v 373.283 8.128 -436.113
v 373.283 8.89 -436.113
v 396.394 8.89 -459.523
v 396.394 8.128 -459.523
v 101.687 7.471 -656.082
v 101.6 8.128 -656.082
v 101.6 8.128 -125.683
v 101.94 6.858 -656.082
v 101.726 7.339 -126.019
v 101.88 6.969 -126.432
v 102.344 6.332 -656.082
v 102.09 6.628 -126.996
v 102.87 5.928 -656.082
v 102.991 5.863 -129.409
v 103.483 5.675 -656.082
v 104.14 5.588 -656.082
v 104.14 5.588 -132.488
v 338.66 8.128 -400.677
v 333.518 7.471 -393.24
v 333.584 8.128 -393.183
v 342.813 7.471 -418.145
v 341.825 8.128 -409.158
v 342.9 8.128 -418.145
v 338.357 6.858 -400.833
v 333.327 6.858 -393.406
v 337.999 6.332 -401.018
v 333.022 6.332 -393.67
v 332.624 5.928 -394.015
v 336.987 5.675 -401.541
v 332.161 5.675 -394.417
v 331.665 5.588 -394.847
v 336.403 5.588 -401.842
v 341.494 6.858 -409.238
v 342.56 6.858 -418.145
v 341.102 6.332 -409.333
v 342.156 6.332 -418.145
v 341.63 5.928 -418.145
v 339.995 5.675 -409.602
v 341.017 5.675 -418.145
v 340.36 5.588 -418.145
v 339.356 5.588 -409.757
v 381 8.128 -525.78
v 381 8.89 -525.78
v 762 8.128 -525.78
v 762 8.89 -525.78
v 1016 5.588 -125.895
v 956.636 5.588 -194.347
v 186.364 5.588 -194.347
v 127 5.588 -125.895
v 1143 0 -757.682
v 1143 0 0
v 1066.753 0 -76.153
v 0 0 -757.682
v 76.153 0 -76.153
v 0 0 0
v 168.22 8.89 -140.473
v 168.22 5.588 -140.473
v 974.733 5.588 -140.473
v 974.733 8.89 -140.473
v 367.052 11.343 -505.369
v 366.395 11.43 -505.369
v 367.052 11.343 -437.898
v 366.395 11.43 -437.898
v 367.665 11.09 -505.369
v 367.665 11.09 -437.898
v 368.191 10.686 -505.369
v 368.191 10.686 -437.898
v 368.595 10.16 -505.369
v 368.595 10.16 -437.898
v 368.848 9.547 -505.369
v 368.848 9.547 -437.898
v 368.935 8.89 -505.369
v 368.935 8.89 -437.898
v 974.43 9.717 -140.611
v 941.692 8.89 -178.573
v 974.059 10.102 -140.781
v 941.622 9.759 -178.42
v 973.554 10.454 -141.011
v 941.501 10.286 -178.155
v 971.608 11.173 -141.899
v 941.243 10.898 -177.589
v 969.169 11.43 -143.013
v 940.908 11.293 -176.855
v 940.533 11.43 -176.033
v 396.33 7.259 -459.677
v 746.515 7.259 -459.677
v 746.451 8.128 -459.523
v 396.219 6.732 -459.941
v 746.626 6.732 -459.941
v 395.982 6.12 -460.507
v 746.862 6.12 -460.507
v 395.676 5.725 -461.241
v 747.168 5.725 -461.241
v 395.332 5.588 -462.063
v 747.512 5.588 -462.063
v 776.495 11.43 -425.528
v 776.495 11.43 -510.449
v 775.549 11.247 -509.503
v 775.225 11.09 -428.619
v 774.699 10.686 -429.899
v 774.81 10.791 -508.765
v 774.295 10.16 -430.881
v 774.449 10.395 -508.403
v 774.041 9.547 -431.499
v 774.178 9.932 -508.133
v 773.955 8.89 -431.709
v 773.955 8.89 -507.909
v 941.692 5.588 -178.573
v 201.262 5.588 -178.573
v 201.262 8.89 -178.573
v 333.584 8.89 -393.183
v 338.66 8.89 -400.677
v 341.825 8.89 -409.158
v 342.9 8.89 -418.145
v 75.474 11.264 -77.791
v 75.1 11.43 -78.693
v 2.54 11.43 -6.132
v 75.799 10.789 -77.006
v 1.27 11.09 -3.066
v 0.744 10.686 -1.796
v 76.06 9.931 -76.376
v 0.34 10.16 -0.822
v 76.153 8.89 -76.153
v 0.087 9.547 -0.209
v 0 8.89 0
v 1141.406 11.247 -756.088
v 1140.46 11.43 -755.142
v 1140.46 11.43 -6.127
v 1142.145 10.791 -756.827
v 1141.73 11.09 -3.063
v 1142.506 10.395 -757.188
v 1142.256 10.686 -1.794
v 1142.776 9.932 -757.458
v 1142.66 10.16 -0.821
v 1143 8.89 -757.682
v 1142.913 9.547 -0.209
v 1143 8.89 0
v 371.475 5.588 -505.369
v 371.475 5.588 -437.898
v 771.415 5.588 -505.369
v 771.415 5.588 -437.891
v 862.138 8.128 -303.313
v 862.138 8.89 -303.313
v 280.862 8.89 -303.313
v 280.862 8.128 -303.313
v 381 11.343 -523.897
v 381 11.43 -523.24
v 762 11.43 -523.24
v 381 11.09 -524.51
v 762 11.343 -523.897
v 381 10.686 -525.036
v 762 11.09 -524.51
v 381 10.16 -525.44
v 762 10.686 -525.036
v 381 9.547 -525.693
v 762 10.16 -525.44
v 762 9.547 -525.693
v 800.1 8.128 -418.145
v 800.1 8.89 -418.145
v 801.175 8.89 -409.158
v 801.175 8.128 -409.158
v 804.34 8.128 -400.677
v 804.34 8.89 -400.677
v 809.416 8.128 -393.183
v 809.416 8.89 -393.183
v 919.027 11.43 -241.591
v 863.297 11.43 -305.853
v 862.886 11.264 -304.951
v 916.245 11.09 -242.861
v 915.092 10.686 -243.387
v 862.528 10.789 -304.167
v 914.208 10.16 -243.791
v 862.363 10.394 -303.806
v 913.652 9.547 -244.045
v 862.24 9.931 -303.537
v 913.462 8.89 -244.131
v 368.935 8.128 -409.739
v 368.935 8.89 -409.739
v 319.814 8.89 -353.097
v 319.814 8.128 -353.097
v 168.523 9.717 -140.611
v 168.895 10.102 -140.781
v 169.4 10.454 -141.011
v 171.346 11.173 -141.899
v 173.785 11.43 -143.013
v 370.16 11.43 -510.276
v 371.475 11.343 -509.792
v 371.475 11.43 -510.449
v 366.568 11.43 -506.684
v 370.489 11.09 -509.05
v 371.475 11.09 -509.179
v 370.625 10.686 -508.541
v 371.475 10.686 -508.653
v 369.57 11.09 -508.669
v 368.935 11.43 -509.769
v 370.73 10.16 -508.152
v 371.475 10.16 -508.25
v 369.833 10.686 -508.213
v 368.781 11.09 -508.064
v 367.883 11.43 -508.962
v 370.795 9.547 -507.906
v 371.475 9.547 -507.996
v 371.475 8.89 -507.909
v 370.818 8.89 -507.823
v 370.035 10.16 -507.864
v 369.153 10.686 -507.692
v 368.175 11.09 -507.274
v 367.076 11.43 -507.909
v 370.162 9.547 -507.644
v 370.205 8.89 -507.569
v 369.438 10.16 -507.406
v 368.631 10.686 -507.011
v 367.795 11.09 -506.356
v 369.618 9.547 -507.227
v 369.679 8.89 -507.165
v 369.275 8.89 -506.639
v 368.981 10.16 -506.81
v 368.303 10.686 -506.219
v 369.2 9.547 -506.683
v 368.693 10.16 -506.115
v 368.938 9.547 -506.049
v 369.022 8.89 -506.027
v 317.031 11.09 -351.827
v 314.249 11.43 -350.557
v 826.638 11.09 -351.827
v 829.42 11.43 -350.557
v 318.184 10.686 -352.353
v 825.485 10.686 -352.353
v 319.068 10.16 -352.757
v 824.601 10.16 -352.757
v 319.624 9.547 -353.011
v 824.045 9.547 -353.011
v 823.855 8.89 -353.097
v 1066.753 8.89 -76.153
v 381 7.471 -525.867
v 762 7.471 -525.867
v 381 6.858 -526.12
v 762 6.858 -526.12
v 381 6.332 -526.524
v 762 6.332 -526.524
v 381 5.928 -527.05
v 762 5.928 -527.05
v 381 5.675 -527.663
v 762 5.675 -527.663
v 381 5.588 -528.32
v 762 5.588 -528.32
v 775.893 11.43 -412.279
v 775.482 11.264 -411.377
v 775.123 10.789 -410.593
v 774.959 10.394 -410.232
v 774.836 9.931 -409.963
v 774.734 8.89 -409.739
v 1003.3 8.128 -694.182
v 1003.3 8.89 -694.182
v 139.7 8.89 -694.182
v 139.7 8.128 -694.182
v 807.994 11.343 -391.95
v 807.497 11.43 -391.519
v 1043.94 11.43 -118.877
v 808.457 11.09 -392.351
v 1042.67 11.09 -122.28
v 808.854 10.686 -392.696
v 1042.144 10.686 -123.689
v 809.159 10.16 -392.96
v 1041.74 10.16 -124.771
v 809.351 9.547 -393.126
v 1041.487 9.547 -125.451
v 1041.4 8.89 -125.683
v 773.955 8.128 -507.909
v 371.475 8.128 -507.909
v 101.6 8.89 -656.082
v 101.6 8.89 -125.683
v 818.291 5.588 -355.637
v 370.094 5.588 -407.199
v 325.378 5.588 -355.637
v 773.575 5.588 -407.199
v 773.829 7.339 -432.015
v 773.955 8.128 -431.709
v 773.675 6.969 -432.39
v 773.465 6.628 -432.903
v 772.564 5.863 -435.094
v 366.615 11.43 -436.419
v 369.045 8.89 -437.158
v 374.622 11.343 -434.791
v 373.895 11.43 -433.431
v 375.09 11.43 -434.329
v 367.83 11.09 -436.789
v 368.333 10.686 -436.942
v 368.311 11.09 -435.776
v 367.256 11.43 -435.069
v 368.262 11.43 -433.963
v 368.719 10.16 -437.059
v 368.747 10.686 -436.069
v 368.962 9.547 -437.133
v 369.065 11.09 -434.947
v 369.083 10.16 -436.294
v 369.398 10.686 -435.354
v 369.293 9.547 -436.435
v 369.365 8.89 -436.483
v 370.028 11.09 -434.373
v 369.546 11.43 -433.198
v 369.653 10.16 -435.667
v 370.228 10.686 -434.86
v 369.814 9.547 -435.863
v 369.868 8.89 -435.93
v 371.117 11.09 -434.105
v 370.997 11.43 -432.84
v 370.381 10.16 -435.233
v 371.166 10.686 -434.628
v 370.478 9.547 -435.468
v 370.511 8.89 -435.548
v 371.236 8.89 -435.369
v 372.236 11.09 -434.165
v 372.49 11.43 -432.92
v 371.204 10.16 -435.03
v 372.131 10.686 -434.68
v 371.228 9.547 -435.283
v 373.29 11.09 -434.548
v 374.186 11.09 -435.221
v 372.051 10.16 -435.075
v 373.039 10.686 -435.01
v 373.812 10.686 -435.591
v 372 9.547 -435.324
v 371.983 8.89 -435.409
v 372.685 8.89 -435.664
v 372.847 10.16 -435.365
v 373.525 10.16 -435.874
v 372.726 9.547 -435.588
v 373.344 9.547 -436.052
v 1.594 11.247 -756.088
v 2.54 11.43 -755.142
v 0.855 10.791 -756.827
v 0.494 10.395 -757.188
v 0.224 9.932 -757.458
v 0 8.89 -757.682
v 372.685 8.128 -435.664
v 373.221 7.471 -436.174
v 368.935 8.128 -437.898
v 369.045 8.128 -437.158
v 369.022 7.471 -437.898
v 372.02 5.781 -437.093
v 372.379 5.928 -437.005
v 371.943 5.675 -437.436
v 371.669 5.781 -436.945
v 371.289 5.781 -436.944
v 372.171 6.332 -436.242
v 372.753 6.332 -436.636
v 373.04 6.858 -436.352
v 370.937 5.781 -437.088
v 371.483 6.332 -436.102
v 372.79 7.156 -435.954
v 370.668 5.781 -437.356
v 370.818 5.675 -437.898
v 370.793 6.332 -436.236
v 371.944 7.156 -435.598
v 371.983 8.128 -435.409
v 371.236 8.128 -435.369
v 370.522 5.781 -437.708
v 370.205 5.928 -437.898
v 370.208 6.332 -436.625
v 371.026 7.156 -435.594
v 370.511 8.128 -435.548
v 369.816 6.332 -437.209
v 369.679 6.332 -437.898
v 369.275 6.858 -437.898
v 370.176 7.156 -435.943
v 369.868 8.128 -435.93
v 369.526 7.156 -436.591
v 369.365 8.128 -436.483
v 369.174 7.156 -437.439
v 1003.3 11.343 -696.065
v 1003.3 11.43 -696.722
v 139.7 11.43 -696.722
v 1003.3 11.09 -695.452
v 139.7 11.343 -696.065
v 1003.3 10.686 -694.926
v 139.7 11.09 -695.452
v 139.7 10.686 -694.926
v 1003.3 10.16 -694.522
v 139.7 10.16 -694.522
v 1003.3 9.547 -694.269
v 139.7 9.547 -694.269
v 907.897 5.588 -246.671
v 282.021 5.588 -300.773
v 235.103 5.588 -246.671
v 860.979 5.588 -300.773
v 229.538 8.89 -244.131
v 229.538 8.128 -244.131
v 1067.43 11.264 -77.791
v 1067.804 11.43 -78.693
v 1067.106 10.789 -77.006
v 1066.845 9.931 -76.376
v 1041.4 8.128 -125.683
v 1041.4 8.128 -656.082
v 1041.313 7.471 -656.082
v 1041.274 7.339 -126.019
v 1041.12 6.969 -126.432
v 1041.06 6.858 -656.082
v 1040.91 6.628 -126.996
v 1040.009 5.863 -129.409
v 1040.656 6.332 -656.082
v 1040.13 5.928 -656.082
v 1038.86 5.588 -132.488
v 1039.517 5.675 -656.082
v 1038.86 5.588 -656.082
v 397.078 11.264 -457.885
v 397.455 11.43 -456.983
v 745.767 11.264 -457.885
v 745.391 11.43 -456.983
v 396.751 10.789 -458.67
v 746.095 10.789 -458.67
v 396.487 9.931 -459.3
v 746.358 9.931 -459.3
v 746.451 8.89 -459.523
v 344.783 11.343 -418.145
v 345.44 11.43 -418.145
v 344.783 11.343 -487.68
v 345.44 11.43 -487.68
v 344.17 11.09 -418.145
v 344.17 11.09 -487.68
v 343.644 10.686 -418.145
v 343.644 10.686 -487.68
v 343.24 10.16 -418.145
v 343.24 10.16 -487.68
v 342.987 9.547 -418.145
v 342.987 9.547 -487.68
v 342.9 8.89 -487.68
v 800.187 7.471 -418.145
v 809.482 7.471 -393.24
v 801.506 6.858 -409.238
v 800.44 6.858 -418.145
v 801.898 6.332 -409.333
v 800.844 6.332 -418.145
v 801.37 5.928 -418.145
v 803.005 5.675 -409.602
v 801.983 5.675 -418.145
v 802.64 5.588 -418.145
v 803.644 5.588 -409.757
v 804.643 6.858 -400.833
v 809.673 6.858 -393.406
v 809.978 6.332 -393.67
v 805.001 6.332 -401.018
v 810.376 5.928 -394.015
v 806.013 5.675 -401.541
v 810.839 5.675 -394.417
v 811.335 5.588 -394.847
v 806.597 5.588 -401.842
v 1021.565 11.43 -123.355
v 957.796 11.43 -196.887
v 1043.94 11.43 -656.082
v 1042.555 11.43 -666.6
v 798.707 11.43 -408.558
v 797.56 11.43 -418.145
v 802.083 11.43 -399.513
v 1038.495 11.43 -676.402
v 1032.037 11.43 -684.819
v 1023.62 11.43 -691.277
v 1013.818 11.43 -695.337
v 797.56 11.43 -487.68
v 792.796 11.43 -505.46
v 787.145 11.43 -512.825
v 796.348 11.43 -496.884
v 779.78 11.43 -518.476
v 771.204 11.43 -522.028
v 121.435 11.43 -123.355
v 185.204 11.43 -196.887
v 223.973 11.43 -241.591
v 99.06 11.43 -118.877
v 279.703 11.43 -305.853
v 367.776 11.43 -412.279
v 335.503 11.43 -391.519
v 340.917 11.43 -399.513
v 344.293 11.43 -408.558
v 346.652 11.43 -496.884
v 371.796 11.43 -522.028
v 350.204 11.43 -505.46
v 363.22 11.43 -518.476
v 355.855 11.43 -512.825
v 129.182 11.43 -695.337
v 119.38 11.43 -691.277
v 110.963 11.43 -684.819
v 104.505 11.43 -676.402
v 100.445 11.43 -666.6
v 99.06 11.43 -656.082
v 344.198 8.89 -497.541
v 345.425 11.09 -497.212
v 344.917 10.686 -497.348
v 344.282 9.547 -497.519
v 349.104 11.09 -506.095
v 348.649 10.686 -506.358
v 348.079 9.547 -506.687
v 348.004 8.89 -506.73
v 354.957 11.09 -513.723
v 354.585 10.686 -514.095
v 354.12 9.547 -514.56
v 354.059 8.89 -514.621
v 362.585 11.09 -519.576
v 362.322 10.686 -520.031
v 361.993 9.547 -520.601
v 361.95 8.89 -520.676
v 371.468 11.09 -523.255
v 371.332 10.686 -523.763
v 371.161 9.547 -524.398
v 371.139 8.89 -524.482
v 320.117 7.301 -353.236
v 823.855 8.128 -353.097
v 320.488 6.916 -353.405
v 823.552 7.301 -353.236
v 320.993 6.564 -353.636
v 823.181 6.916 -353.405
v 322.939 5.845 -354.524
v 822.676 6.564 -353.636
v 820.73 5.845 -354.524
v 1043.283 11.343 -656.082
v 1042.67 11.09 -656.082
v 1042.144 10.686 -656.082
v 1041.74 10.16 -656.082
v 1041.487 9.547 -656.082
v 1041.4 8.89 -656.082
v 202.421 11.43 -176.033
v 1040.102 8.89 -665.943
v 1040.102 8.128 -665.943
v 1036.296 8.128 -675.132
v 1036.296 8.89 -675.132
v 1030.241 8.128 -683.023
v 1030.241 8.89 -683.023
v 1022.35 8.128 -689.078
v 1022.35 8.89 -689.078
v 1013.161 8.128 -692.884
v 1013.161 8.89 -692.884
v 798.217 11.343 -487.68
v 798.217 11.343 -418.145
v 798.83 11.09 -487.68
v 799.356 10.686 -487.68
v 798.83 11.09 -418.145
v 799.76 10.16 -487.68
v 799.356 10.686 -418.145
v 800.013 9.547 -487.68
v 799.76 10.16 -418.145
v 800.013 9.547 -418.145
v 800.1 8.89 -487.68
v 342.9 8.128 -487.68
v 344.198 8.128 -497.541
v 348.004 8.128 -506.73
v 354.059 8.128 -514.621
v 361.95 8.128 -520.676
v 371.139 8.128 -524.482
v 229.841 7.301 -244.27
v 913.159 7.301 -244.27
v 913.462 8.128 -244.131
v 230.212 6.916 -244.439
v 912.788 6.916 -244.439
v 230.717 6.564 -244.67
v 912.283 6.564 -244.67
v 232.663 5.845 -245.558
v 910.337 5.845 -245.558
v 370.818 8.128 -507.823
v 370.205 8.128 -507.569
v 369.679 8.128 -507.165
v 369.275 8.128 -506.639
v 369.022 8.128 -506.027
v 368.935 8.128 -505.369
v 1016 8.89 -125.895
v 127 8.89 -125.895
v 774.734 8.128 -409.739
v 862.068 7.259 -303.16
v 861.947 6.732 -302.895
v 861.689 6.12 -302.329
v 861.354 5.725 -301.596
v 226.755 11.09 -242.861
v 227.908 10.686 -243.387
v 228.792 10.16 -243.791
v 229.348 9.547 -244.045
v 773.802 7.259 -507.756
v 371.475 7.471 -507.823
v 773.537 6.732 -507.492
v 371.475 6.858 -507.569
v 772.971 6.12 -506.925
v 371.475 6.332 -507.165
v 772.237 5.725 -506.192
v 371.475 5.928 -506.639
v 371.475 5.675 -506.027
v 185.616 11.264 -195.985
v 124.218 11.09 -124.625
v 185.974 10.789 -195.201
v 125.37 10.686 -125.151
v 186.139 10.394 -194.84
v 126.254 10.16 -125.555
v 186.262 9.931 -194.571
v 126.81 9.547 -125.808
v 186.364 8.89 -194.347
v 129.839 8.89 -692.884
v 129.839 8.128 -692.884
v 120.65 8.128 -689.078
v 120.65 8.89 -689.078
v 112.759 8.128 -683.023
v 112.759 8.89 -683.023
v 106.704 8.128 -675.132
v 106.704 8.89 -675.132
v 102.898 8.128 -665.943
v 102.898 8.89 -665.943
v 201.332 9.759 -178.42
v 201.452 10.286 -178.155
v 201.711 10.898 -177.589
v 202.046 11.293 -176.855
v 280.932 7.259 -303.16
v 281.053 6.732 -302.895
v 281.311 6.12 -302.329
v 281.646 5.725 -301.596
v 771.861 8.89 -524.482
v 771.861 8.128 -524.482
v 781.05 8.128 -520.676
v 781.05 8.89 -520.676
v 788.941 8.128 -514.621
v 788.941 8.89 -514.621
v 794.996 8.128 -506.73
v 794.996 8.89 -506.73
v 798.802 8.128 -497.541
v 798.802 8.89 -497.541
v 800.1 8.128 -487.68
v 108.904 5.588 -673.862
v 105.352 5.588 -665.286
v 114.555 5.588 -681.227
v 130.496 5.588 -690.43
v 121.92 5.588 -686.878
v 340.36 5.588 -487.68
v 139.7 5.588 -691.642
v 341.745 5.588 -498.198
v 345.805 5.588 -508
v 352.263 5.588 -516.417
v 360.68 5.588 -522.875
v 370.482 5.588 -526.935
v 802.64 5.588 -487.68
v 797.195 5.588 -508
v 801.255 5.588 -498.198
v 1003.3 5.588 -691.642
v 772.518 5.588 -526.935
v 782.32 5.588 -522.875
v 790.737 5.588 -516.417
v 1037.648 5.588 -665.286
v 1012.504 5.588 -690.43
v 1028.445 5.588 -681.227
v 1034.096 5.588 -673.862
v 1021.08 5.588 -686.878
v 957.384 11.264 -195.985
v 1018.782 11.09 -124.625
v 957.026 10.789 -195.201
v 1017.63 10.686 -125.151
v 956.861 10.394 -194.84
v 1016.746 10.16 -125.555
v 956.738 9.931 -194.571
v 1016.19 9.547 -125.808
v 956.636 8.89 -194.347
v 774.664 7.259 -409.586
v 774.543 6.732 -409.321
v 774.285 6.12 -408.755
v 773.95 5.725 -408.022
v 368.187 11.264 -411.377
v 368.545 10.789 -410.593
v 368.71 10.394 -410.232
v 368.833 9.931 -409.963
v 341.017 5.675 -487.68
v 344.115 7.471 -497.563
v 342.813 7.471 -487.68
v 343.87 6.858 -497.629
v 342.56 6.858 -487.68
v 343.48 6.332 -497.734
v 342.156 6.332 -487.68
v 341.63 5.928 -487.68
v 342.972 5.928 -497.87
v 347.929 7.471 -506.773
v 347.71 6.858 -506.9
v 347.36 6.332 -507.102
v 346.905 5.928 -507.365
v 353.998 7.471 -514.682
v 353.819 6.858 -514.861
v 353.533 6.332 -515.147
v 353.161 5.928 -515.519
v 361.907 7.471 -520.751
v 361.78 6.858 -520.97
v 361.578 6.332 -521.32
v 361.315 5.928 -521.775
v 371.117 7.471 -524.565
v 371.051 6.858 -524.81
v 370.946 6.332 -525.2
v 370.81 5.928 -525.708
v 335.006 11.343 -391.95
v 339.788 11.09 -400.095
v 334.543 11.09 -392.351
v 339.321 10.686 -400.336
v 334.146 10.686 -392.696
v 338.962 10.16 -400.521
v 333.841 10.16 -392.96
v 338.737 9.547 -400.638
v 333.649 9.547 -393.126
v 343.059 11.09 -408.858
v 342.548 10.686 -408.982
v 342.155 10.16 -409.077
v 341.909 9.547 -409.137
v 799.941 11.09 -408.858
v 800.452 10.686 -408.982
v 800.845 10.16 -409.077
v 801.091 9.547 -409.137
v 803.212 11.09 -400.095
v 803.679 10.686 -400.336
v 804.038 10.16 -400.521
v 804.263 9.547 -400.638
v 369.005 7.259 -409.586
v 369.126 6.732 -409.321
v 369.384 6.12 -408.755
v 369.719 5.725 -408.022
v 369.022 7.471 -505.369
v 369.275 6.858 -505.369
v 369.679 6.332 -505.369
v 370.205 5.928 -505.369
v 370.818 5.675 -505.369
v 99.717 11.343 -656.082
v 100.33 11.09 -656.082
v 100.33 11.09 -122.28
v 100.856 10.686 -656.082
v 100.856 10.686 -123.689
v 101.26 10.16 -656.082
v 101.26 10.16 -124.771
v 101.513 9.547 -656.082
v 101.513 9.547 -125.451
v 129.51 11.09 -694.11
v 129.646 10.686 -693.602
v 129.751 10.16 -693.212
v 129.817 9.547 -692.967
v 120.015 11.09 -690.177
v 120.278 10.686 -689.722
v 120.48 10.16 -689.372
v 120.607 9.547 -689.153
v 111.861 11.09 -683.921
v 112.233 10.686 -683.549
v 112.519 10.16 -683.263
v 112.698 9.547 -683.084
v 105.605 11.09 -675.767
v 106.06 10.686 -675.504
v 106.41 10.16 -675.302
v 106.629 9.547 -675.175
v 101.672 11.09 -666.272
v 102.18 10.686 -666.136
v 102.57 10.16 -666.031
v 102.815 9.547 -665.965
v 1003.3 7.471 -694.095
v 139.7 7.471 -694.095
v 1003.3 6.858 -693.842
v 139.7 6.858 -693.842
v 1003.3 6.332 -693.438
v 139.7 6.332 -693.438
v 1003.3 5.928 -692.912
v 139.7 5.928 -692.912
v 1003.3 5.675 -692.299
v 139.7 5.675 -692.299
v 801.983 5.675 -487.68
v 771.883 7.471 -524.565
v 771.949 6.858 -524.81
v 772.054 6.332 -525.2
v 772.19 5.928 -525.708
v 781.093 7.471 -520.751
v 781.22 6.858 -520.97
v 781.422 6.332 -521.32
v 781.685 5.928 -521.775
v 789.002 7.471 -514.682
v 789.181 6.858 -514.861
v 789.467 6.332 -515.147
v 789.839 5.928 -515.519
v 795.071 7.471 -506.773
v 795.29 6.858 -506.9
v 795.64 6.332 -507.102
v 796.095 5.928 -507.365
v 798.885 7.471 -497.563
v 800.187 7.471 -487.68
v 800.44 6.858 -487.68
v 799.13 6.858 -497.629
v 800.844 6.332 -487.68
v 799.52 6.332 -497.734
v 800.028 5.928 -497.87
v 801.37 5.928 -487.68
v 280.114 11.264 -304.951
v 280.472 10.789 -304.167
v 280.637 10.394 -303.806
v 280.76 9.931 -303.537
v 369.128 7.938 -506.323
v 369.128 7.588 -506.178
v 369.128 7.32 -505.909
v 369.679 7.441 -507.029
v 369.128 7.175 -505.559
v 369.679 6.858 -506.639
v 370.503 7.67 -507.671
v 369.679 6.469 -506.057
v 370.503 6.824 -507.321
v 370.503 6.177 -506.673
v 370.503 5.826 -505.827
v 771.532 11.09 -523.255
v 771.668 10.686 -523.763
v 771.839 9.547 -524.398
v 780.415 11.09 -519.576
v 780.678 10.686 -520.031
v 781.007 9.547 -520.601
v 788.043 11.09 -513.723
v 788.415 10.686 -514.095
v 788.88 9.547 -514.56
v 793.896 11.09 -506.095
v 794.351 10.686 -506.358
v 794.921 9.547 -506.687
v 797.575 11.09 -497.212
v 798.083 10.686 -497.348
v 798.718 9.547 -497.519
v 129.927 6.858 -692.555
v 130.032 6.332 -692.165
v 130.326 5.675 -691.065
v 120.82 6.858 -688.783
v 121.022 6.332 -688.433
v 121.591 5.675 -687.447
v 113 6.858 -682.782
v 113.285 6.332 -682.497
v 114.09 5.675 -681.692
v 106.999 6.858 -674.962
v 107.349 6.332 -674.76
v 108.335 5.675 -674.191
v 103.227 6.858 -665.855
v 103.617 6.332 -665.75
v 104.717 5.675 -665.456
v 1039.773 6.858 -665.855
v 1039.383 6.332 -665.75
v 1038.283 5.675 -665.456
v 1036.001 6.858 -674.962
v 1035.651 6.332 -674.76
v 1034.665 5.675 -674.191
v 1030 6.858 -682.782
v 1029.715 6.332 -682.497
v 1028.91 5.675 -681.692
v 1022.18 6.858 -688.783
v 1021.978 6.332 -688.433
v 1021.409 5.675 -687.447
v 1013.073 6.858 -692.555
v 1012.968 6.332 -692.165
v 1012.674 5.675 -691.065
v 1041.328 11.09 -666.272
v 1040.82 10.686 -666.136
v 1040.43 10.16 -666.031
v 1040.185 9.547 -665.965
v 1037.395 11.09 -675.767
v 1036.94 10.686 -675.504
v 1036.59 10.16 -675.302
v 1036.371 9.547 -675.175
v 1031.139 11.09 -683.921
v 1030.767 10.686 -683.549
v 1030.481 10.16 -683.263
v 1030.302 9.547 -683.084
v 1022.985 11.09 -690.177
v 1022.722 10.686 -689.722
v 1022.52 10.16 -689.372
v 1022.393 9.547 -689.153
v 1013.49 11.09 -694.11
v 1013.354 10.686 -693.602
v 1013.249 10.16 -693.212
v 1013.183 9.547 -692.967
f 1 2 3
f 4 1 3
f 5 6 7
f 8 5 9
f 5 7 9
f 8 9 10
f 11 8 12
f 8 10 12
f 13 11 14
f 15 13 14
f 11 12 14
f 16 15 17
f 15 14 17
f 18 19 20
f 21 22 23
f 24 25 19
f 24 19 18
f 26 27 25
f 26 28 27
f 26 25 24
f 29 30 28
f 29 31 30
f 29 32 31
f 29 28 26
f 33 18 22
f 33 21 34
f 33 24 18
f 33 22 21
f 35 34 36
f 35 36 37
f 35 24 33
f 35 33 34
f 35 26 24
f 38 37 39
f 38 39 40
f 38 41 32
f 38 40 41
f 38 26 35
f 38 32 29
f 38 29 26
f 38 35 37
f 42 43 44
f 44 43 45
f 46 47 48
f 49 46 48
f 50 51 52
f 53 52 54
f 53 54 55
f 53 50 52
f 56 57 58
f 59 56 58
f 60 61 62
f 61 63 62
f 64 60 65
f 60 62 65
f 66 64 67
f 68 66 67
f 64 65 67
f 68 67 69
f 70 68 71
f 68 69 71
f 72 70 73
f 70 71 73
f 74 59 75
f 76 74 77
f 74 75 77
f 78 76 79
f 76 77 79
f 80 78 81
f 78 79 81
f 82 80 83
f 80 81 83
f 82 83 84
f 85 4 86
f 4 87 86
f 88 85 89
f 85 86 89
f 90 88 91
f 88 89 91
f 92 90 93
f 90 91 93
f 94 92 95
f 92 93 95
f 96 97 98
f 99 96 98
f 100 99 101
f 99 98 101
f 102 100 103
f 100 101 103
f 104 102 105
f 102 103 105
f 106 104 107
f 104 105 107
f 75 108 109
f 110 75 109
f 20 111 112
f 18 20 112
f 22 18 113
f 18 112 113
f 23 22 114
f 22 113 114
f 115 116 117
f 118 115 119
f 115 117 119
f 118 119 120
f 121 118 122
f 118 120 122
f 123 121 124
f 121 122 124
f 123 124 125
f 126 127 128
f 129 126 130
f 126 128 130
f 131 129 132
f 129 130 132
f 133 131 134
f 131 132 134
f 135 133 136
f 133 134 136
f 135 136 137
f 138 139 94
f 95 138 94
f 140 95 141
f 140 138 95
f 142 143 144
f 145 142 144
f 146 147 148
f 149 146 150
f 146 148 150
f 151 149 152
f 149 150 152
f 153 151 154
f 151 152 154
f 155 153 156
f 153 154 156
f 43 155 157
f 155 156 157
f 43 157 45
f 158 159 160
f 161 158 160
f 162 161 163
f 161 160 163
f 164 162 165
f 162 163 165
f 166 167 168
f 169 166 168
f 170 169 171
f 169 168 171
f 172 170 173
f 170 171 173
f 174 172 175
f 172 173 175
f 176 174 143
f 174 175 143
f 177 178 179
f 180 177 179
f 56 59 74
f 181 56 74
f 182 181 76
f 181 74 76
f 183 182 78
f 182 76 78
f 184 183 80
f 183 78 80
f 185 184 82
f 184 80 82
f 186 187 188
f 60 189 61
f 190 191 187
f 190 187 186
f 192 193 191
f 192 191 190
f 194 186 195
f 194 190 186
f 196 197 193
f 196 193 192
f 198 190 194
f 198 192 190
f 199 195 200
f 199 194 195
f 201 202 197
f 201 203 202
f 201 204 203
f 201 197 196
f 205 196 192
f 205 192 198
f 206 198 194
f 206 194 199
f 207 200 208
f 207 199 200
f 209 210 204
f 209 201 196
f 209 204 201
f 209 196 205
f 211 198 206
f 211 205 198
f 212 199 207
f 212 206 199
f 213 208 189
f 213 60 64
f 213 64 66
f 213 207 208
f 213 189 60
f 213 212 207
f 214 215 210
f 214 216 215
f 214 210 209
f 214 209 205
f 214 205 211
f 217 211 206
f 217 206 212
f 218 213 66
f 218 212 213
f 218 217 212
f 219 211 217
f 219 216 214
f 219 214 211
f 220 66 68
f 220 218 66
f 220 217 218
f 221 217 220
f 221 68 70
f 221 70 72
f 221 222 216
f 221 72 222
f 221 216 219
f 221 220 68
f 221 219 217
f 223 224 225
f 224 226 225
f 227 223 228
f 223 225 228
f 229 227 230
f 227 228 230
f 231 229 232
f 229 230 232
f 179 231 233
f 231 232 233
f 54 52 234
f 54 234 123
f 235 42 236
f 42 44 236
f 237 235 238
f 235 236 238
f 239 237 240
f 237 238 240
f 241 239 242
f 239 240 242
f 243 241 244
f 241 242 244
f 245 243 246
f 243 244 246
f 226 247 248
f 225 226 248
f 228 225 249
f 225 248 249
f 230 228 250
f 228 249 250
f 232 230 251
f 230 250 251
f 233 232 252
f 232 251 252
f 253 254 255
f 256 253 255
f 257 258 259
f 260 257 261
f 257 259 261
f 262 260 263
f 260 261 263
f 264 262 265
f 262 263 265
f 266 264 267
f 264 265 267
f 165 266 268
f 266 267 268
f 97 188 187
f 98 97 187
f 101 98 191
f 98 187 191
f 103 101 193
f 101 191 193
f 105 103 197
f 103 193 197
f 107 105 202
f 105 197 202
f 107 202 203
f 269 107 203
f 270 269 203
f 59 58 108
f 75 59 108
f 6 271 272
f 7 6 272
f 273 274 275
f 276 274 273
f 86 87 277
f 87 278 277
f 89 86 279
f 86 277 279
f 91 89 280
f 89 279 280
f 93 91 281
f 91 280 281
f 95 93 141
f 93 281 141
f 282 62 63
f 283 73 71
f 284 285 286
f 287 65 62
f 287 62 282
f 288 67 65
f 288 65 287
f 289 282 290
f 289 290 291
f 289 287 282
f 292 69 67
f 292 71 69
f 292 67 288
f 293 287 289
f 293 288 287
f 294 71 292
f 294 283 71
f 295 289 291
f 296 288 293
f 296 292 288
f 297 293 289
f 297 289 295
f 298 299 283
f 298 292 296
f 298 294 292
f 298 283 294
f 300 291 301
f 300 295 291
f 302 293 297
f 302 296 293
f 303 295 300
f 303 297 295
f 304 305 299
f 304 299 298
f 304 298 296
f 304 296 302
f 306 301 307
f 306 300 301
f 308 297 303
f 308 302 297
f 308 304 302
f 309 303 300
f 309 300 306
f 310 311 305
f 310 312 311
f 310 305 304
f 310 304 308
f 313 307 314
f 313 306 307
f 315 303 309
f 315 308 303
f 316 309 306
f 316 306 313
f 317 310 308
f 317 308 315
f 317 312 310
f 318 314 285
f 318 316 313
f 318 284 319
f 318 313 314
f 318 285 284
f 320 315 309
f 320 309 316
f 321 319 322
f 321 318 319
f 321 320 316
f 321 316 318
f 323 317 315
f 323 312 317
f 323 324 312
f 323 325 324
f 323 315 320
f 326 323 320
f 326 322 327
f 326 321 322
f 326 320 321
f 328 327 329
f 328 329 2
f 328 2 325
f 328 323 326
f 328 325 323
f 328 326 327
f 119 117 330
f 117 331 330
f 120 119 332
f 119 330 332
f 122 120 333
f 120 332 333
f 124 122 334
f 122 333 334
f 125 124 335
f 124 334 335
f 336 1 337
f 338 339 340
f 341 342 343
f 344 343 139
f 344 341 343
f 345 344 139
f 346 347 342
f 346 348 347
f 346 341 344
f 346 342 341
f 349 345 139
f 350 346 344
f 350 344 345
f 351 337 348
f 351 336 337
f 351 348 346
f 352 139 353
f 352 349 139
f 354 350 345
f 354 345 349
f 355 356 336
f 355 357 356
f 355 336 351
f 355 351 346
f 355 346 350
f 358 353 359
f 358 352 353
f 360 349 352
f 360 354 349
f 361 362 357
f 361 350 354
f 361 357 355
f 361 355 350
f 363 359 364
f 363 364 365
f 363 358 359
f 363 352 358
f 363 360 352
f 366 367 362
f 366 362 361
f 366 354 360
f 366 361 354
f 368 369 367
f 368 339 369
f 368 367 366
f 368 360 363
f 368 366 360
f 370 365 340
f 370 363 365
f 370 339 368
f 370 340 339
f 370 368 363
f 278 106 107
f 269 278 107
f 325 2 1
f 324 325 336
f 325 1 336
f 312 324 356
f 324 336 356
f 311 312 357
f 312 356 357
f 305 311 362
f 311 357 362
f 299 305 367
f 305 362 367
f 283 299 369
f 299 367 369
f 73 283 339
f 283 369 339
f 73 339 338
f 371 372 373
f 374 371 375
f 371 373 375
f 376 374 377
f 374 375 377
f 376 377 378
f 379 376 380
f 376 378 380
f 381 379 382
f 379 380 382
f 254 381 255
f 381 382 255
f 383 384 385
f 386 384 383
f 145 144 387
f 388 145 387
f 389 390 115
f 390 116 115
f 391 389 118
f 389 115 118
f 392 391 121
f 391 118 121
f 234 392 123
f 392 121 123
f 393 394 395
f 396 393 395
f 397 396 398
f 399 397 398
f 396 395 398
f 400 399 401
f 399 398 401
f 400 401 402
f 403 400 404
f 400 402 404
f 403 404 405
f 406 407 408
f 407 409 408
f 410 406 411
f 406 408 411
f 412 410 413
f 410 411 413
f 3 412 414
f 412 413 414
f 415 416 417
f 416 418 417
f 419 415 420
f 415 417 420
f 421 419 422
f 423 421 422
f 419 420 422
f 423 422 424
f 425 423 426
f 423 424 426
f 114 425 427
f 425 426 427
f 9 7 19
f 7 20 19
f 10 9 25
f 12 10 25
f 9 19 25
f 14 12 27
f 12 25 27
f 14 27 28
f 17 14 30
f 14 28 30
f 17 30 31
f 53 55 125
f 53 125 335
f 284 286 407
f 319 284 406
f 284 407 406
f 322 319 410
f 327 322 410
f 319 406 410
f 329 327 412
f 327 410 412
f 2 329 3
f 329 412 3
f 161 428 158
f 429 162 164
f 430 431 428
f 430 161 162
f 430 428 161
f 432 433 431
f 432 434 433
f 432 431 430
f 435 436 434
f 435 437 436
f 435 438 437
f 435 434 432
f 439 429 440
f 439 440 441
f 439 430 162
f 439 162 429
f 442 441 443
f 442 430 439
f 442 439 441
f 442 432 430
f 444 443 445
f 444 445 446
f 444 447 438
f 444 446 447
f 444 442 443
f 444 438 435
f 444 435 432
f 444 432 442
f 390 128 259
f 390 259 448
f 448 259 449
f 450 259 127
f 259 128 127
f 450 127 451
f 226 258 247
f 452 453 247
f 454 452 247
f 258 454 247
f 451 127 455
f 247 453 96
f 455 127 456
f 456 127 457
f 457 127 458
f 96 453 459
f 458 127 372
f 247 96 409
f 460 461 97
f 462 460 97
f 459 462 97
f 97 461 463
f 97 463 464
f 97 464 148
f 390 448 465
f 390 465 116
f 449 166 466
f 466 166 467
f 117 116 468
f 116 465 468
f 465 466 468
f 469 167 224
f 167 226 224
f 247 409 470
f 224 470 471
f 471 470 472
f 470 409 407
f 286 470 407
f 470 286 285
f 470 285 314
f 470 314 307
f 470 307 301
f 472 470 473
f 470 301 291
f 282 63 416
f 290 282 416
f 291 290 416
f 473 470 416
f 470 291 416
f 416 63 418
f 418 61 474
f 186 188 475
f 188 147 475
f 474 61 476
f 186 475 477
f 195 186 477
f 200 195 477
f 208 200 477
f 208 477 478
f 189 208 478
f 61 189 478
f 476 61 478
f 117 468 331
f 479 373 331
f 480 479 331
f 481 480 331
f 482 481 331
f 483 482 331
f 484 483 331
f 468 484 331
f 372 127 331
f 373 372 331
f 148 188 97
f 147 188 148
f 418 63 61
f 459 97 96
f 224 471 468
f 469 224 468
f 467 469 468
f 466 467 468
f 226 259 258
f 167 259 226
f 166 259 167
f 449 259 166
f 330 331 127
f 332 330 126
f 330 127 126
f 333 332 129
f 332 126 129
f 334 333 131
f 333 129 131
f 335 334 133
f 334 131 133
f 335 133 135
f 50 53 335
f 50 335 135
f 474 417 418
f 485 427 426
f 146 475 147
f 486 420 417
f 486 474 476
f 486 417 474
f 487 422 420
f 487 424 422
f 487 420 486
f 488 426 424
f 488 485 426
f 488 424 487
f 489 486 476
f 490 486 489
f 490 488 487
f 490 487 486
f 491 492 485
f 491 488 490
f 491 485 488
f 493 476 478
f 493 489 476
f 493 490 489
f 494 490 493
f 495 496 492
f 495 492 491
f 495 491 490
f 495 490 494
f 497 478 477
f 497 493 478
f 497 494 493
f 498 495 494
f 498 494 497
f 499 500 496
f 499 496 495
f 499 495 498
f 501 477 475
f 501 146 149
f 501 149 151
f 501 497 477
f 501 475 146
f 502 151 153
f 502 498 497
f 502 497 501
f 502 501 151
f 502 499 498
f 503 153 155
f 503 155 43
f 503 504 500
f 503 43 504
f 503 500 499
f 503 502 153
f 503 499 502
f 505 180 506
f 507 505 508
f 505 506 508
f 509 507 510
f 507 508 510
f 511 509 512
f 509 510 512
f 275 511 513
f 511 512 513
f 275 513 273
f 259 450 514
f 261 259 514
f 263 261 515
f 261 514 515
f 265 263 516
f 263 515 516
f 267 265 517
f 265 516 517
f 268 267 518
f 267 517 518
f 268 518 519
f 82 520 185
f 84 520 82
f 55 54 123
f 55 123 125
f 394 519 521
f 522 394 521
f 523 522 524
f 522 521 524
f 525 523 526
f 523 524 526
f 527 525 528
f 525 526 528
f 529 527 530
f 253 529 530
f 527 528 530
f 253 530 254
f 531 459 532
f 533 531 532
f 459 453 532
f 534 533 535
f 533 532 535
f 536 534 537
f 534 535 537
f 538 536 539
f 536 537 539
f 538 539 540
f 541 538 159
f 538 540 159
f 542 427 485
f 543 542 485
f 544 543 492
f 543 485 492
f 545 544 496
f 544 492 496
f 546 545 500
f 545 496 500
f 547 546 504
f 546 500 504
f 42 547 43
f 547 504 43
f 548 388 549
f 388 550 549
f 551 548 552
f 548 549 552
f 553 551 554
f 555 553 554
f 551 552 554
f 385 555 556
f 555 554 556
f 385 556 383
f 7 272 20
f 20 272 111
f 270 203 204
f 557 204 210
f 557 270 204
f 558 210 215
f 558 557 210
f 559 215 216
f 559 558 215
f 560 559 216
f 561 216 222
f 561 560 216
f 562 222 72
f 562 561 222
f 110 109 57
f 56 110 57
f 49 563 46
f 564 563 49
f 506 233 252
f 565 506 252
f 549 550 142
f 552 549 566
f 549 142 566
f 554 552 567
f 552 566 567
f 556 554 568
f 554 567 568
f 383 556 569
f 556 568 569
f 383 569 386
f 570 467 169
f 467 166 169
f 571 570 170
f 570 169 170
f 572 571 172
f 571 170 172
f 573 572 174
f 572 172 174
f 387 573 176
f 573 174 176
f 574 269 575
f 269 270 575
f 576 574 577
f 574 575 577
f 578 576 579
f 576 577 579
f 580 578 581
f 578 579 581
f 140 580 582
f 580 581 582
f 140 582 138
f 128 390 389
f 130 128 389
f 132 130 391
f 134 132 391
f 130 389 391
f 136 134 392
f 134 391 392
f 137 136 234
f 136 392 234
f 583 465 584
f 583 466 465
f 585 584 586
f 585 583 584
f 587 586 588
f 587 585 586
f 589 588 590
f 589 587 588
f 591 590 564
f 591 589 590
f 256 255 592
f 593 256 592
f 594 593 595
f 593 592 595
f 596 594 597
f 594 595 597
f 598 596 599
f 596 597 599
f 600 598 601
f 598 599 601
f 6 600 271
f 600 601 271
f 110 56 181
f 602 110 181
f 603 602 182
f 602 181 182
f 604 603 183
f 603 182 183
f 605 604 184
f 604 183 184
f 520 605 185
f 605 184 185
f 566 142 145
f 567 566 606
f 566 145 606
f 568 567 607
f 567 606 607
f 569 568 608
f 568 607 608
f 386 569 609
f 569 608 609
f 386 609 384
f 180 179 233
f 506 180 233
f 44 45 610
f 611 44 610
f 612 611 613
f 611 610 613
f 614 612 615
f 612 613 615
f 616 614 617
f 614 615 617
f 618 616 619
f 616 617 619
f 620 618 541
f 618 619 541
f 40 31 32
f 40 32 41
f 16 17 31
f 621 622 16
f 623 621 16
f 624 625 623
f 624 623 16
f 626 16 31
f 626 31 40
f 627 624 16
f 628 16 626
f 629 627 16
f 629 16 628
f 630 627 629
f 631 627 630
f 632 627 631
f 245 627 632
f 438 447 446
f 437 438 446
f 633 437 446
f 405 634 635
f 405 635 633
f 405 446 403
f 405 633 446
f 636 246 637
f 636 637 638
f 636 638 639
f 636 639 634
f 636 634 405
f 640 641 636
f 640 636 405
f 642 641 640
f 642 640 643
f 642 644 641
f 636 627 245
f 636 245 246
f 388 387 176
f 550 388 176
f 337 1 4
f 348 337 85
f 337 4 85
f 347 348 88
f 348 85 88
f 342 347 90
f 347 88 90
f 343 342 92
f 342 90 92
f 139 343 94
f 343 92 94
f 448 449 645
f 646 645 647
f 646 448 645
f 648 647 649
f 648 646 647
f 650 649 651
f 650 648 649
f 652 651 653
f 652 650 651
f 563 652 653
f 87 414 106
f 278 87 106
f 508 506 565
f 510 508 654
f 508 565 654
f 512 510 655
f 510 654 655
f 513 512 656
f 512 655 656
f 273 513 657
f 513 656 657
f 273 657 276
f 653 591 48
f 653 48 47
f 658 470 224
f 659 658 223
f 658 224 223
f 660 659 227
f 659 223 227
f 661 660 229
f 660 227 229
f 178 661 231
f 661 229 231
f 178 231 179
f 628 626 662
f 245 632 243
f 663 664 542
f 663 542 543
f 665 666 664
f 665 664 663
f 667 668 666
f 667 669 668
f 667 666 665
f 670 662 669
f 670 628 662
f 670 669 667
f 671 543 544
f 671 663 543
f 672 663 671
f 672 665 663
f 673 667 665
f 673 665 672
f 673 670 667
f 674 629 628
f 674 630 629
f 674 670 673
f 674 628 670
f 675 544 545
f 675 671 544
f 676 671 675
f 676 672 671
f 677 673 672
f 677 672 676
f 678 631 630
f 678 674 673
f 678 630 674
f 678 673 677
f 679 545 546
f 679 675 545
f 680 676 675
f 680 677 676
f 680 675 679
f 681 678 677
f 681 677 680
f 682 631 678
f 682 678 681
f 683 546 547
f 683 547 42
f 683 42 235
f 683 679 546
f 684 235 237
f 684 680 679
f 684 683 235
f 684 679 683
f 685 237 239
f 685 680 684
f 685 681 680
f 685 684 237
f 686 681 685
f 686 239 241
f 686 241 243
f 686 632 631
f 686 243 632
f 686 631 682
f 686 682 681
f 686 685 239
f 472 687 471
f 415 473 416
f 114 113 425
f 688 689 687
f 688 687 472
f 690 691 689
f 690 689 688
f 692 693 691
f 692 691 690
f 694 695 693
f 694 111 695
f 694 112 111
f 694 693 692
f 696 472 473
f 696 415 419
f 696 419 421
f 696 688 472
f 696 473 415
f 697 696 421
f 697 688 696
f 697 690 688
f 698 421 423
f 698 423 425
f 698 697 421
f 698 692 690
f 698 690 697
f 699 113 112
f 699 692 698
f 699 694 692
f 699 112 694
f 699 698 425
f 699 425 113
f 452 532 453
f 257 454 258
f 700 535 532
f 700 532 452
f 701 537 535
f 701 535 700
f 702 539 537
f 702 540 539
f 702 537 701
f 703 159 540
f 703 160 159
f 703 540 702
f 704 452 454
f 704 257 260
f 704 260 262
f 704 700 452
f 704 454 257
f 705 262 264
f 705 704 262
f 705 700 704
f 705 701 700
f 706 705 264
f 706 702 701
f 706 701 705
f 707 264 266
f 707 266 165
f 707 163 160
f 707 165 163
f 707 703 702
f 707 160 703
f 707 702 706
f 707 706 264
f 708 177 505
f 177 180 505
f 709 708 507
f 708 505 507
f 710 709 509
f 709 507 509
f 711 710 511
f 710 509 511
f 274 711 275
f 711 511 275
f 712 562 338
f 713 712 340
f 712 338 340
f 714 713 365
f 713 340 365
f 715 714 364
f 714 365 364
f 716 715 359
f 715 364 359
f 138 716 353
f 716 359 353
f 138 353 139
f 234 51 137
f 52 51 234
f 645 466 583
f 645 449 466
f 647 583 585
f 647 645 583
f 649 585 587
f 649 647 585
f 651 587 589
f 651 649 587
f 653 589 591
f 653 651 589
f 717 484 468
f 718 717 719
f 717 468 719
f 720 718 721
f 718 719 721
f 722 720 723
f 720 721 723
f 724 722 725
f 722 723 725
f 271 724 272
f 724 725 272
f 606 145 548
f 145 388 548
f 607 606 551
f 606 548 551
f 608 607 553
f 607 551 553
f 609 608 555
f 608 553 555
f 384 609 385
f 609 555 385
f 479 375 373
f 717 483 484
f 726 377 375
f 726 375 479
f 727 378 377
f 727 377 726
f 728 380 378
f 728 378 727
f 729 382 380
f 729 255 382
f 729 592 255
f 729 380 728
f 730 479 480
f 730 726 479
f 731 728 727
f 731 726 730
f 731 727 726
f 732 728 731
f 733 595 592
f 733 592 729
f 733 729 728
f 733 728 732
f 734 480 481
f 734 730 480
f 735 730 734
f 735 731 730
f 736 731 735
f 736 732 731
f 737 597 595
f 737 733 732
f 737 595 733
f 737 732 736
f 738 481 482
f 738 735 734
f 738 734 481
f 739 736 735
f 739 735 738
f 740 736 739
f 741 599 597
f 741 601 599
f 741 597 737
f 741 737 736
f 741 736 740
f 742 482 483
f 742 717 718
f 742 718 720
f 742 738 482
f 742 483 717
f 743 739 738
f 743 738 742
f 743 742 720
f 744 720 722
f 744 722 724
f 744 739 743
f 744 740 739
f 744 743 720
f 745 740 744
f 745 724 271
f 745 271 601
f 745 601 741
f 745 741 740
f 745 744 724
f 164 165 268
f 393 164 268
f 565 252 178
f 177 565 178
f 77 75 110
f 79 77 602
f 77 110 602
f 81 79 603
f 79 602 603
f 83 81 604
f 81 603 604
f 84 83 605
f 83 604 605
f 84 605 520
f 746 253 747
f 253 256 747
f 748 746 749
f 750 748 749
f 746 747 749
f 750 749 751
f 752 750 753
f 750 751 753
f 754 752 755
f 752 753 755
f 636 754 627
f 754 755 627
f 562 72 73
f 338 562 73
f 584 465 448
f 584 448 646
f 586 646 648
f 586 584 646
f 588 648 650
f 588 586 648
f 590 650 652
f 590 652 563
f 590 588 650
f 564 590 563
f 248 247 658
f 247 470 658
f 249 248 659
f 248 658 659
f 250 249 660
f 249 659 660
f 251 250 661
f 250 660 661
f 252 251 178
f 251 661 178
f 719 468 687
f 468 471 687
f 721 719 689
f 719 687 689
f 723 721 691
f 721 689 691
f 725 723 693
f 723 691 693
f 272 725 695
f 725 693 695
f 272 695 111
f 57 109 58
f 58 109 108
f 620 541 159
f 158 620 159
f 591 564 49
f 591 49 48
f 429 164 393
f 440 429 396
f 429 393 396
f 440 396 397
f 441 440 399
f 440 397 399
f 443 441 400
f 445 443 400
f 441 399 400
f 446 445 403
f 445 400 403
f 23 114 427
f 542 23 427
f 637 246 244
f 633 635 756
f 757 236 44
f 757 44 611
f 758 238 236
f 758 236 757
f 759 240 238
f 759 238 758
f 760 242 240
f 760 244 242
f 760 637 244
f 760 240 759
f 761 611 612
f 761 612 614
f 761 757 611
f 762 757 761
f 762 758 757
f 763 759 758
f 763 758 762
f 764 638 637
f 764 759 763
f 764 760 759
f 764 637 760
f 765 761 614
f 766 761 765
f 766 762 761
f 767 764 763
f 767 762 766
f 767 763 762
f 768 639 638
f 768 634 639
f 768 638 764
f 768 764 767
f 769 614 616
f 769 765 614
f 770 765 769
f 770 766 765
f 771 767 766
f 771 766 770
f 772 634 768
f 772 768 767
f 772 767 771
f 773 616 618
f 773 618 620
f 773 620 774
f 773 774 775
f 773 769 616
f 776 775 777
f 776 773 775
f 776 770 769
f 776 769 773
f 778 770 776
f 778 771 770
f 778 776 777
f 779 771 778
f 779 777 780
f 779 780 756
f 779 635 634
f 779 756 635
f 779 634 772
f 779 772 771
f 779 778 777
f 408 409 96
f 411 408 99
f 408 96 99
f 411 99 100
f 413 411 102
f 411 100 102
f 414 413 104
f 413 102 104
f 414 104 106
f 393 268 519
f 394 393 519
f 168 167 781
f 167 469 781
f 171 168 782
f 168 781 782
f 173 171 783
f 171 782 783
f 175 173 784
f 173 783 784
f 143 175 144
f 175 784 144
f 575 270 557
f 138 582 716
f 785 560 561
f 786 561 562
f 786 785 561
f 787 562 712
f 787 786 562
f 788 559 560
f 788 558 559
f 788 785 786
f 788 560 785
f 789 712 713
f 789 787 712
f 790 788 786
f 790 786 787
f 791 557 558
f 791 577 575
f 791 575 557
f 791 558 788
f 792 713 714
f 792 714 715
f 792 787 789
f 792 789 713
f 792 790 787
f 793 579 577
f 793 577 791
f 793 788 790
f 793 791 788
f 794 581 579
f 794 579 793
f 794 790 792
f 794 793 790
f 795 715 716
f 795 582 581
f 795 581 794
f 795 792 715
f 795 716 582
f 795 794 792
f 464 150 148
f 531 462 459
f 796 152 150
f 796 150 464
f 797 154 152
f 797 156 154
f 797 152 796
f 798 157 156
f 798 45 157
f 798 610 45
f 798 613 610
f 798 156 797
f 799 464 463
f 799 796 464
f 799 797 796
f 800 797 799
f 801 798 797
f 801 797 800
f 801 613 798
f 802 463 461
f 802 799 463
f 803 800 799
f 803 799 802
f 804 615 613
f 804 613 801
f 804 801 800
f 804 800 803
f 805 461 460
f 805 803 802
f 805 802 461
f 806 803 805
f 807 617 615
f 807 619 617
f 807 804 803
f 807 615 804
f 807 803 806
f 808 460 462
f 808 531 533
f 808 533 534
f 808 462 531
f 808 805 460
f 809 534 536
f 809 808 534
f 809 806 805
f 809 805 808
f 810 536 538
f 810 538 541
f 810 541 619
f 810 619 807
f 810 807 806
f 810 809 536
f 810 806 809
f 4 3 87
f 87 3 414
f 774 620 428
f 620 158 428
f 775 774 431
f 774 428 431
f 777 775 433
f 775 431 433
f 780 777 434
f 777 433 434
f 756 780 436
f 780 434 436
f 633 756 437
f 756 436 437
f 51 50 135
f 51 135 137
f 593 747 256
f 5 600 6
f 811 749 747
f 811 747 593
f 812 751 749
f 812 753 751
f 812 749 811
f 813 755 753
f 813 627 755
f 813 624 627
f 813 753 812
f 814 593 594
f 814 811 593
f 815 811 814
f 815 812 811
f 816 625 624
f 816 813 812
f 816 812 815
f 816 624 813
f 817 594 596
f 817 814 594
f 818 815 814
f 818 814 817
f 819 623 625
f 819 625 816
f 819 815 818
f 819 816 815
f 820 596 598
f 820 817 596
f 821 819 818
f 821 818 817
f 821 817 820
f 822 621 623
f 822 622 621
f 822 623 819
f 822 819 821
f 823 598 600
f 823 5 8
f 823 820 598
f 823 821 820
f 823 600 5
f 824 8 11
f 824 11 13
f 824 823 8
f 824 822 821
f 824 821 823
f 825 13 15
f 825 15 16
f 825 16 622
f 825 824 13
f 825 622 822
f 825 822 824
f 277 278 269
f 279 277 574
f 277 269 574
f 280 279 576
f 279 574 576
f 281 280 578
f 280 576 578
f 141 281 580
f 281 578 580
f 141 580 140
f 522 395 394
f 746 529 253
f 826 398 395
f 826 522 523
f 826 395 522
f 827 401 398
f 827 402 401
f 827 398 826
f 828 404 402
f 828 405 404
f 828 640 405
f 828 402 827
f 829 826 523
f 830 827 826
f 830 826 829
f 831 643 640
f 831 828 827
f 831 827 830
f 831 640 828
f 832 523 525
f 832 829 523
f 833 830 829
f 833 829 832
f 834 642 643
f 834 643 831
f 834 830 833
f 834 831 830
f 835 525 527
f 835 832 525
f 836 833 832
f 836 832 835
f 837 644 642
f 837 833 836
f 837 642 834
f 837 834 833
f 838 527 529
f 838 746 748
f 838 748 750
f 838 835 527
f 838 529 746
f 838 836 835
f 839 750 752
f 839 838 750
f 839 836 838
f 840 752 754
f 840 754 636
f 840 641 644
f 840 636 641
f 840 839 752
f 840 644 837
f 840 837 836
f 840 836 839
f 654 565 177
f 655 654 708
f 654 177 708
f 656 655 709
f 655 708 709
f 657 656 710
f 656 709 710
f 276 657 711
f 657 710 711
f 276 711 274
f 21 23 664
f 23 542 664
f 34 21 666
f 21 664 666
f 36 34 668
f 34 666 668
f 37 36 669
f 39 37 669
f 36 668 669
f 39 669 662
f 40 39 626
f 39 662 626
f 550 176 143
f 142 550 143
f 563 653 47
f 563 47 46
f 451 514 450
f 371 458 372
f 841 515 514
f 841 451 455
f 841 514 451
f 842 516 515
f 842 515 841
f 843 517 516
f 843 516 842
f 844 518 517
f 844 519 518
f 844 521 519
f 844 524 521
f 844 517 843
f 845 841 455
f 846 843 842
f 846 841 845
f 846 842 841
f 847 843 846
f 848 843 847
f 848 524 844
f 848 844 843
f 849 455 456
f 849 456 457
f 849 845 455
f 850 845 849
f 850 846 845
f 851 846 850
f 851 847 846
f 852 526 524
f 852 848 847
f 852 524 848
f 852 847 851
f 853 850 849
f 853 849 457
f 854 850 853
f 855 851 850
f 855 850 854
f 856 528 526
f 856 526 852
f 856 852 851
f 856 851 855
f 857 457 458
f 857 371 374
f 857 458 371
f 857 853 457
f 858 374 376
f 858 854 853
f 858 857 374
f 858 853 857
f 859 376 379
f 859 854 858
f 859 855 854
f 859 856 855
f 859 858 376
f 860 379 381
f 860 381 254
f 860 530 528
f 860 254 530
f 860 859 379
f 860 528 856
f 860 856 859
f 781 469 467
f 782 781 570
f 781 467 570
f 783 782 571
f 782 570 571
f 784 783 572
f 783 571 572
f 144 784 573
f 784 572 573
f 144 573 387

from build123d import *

# Parameters (mm, degrees)
BASE_FLANGE1_DEPTH = 11.43
CUT_EXTRUDE1_DEPTH = 5.842
CUT_EXTRUDE2_DEPTH = 5.842
BASE_FLANGE2_DEPTH = 5.842
CUT_EXTRUDE3_DEPTH = 5.842
FILLET1_R          = 2.54
FILLET2_R          = 2.54
FILLET3_R          = 2.54
FILLET4_R          = 2.54
FILLET5_R          = 2.54


# Sheet-metal steps are written as plain solids
with BuildPart() as part:
    # Sketch1 → Base-Flange1 (new body)
    with BuildSketch(Plane(origin=(0, 0, 0), x_dir=(1, 0, 0), z_dir=(0, 1, 0))):
        Polygon((0, 0), (0, 757.682), (1143, 757.682), (1143, 0), (1066.752571907, 76.152571907), (76.152571907, 76.152571907), align=None)
    extrude(amount=BASE_FLANGE1_DEPTH)

    # Sketch6 → Cut-Extrude1 (cut)
    with BuildSketch(Plane(origin=(0, 11.43, 0), x_dir=(1, 0, 0), z_dir=(0, 1, 0))):
        with BuildLine():
            Line((101.6, 656.082), (101.6, 125.682571907))
            Line((101.6, 125.682571907), (333.583764746, 393.18307912))
            ThreePointArc((333.583764746, 393.18307912), (340.495037728, 404.823200721), (342.9, 418.145148086))
            Line((342.9, 418.145148086), (342.9, 487.68))
            ThreePointArc((342.9, 487.68), (354.059231637, 514.620768363), (381, 525.78))
            Line((381, 525.78), (762, 525.78))
            ThreePointArc((762, 525.78), (788.940768363, 514.620768363), (800.1, 487.68))
            Line((800.1, 487.68), (800.1, 418.145148086))
            ThreePointArc((800.1, 418.145148086), (802.504962272, 404.823200721), (809.416235254, 393.18307912))
            Line((809.416235254, 393.18307912), (1041.4, 125.682571907))
            Line((1041.4, 125.682571907), (1041.4, 656.082))
            ThreePointArc((1041.4, 656.082), (1030.240768363, 683.022768363), (1003.3, 694.182))
            Line((1003.3, 694.182), (139.7, 694.182))
            ThreePointArc((139.7, 694.182), (112.759231637, 683.022768363), (101.6, 656.082))
        make_face()
    extrude(amount=-CUT_EXTRUDE1_DEPTH, mode=Mode.SUBTRACT)

    # Sketch8 → Cut-Extrude2 (cut)
    with BuildSketch(Plane(origin=(0, 11.43, 0), x_dir=(1, 0, 0), z_dir=(0, 1, 0))):
        Polygon((127, 125.894999192), (186.36374215, 194.347337452), (956.63625785, 194.347337452), (1016, 125.894999192), align=None)
    extrude(amount=-CUT_EXTRUDE2_DEPTH, mode=Mode.SUBTRACT)

    # Sketch12 → Cut-Extrude3 (cut)
    with BuildSketch(Plane(origin=(0, 11.43, 0), x_dir=(1, 0, 0), z_dir=(0, 1, 0))):
        Polygon((280.862041135, 303.313337452), (229.537790171, 244.131337452), (913.462209829, 244.131337452), (862.137958865, 303.313337452), align=None)
        Polygon((319.813506588, 353.097337452), (823.855365724, 353.097337452), (774.733872312, 409.739337452), (368.935, 409.739337452), align=None)
        Polygon((368.935, 507.909434387), (368.935, 431.709434387), (396.393706081, 459.523337452), (746.451248248, 459.523337452), (773.954852599, 431.709434387), (773.954852599, 507.909434387), align=None)
    extrude(amount=-CUT_EXTRUDE3_DEPTH, mode=Mode.SUBTRACT)

    # Fillet1
    fillet1_edges = [part.edges().sort_by_distance(p)[0] for p in [
        (571.444926299, 5.588, -507.909434387),
        (368.935, 8.509, -507.909434387),
        (773.954852599, 5.588, -469.809434387),
        (760.203050423, 5.588, -445.61638592),
        (571.422477165, 5.588, -459.523337452),
        (382.664353041, 5.588, -445.61638592),
        (368.935, 5.588, -469.809434387),
        (368.935, 8.509, -431.709434387),
        (571.444926299, 11.43, -507.909434387),
        (368.935, 11.43, -469.809434387),
        (382.664353041, 11.43, -445.61638592),
        (571.422477165, 11.43, -459.523337452),
        (760.203050423, 11.43, -445.61638592),
        (773.954852599, 11.43, -469.809434387),
    ]]
    fillet(fillet1_edges, radius=FILLET1_R)

    # Fillet2
    fillet2_edges = [part.edges().sort_by_distance(p)[0] for p in [
        (571.5, 5.588, -303.313337452),
        (887.800084347, 5.588, -273.722337452),
        (571.5, 5.588, -244.131337452),
        (255.199915653, 5.588, -273.722337452),
        (344.374253294, 5.588, -381.418337452),
        (571.834436156, 5.588, -409.739337452),
        (799.294619018, 5.588, -381.418337452),
        (571.834436156, 5.588, -353.097337452),
    ]]
    fillet(fillet2_edges, radius=FILLET2_R)

    # Fillet3
    fillet3_edges = [part.edges().sort_by_distance(p)[0] for p in [
        (217.591882373, 5.588, -259.432825513),
        (101.6, 5.588, -390.882285953),
        (112.759231637, 5.588, -683.022768363),
        (571.5, 5.588, -694.182),
        (1030.240768363, 5.588, -683.022768363),
        (1041.4, 5.588, -390.882285953),
        (925.408117627, 5.588, -259.432825513),
        (802.504962272, 5.588, -404.823200721),
        (800.1, 5.588, -452.912574043),
        (788.940768363, 5.588, -514.620768363),
        (571.5, 5.588, -525.78),
        (354.059231637, 5.588, -514.620768363),
        (342.9, 5.588, -452.912574043),
        (340.495037728, 5.588, -404.823200721),
    ]]
    fillet(fillet3_edges, radius=FILLET3_R)

    # Fillet5
    fillet5_edges = [part.edges().sort_by_distance(p)[0] for p in [
        (571.5, 11.43, -303.313337452),
        (255.199915653, 11.43, -273.722337452),
        (571.5, 11.43, -244.131337452),
        (887.800084347, 11.43, -273.722337452),
        (344.374253294, 11.43, -381.418337452),
        (571.834436156, 11.43, -353.097337452),
        (799.294619018, 11.43, -381.418337452),
        (571.834436156, 11.43, -409.739337452),
        (1104.876285953, 11.43, -38.076285953),
        (1143, 11.43, -378.841),
        (571.5, 11.43, -757.682),
        (0, 11.43, -378.841),
        (217.591882373, 11.43, -259.432825513),
        (340.495037728, 11.43, -404.823200721),
        (342.9, 11.43, -452.912574043),
        (354.059231637, 11.43, -514.620768363),
        (571.5, 11.43, -525.78),
        (788.940768363, 11.43, -514.620768363),
        (800.1, 11.43, -452.912574043),
        (802.504962272, 11.43, -404.823200721),
        (925.408117627, 11.43, -259.432825513),
        (1041.4, 11.43, -390.882285953),
        (1030.240768363, 11.43, -683.022768363),
        (571.5, 11.43, -694.182),
        (112.759231637, 11.43, -683.022768363),
        (101.6, 11.43, -390.882285953),
        (38.076285953, 11.43, -38.076285953),
        (571.5, 11.43, -125.894999192),
        (986.318128925, 11.43, -160.121168322),
        (571.5, 11.43, -194.347337452),
        (156.681871075, 11.43, -160.121168322),
        (571.452571907, 11.43, -76.152571907),
    ]]
    fillet(fillet5_edges, radius=FILLET5_R)


with BuildPart() as body_2:
    # Sketch9 → Base-Flange2 (new body)
    with BuildSketch(Plane(origin=(0, 5.588, 0), x_dir=(1, 0, 0), z_dir=(0, 1, 0))):
        Polygon((201.261651441, 178.572960564), (168.220288159, 140.472960564), (974.733472203, 140.472960564), (941.692108922, 178.572960564), align=None)
    extrude(amount=BASE_FLANGE2_DEPTH)

    # Fillet4
    fillet4_edges = [body_2.edges().sort_by_distance(p)[0] for p in [
        (571.476880181, 11.43, -140.472960564),
        (958.212790563, 11.43, -159.522960564),
        (571.476880181, 11.43, -178.572960564),
        (184.7409698, 11.43, -159.522960564),
    ]]
    fillet(fillet4_edges, radius=FILLET4_R)


solid = Compound([part.part, body_2.part])
